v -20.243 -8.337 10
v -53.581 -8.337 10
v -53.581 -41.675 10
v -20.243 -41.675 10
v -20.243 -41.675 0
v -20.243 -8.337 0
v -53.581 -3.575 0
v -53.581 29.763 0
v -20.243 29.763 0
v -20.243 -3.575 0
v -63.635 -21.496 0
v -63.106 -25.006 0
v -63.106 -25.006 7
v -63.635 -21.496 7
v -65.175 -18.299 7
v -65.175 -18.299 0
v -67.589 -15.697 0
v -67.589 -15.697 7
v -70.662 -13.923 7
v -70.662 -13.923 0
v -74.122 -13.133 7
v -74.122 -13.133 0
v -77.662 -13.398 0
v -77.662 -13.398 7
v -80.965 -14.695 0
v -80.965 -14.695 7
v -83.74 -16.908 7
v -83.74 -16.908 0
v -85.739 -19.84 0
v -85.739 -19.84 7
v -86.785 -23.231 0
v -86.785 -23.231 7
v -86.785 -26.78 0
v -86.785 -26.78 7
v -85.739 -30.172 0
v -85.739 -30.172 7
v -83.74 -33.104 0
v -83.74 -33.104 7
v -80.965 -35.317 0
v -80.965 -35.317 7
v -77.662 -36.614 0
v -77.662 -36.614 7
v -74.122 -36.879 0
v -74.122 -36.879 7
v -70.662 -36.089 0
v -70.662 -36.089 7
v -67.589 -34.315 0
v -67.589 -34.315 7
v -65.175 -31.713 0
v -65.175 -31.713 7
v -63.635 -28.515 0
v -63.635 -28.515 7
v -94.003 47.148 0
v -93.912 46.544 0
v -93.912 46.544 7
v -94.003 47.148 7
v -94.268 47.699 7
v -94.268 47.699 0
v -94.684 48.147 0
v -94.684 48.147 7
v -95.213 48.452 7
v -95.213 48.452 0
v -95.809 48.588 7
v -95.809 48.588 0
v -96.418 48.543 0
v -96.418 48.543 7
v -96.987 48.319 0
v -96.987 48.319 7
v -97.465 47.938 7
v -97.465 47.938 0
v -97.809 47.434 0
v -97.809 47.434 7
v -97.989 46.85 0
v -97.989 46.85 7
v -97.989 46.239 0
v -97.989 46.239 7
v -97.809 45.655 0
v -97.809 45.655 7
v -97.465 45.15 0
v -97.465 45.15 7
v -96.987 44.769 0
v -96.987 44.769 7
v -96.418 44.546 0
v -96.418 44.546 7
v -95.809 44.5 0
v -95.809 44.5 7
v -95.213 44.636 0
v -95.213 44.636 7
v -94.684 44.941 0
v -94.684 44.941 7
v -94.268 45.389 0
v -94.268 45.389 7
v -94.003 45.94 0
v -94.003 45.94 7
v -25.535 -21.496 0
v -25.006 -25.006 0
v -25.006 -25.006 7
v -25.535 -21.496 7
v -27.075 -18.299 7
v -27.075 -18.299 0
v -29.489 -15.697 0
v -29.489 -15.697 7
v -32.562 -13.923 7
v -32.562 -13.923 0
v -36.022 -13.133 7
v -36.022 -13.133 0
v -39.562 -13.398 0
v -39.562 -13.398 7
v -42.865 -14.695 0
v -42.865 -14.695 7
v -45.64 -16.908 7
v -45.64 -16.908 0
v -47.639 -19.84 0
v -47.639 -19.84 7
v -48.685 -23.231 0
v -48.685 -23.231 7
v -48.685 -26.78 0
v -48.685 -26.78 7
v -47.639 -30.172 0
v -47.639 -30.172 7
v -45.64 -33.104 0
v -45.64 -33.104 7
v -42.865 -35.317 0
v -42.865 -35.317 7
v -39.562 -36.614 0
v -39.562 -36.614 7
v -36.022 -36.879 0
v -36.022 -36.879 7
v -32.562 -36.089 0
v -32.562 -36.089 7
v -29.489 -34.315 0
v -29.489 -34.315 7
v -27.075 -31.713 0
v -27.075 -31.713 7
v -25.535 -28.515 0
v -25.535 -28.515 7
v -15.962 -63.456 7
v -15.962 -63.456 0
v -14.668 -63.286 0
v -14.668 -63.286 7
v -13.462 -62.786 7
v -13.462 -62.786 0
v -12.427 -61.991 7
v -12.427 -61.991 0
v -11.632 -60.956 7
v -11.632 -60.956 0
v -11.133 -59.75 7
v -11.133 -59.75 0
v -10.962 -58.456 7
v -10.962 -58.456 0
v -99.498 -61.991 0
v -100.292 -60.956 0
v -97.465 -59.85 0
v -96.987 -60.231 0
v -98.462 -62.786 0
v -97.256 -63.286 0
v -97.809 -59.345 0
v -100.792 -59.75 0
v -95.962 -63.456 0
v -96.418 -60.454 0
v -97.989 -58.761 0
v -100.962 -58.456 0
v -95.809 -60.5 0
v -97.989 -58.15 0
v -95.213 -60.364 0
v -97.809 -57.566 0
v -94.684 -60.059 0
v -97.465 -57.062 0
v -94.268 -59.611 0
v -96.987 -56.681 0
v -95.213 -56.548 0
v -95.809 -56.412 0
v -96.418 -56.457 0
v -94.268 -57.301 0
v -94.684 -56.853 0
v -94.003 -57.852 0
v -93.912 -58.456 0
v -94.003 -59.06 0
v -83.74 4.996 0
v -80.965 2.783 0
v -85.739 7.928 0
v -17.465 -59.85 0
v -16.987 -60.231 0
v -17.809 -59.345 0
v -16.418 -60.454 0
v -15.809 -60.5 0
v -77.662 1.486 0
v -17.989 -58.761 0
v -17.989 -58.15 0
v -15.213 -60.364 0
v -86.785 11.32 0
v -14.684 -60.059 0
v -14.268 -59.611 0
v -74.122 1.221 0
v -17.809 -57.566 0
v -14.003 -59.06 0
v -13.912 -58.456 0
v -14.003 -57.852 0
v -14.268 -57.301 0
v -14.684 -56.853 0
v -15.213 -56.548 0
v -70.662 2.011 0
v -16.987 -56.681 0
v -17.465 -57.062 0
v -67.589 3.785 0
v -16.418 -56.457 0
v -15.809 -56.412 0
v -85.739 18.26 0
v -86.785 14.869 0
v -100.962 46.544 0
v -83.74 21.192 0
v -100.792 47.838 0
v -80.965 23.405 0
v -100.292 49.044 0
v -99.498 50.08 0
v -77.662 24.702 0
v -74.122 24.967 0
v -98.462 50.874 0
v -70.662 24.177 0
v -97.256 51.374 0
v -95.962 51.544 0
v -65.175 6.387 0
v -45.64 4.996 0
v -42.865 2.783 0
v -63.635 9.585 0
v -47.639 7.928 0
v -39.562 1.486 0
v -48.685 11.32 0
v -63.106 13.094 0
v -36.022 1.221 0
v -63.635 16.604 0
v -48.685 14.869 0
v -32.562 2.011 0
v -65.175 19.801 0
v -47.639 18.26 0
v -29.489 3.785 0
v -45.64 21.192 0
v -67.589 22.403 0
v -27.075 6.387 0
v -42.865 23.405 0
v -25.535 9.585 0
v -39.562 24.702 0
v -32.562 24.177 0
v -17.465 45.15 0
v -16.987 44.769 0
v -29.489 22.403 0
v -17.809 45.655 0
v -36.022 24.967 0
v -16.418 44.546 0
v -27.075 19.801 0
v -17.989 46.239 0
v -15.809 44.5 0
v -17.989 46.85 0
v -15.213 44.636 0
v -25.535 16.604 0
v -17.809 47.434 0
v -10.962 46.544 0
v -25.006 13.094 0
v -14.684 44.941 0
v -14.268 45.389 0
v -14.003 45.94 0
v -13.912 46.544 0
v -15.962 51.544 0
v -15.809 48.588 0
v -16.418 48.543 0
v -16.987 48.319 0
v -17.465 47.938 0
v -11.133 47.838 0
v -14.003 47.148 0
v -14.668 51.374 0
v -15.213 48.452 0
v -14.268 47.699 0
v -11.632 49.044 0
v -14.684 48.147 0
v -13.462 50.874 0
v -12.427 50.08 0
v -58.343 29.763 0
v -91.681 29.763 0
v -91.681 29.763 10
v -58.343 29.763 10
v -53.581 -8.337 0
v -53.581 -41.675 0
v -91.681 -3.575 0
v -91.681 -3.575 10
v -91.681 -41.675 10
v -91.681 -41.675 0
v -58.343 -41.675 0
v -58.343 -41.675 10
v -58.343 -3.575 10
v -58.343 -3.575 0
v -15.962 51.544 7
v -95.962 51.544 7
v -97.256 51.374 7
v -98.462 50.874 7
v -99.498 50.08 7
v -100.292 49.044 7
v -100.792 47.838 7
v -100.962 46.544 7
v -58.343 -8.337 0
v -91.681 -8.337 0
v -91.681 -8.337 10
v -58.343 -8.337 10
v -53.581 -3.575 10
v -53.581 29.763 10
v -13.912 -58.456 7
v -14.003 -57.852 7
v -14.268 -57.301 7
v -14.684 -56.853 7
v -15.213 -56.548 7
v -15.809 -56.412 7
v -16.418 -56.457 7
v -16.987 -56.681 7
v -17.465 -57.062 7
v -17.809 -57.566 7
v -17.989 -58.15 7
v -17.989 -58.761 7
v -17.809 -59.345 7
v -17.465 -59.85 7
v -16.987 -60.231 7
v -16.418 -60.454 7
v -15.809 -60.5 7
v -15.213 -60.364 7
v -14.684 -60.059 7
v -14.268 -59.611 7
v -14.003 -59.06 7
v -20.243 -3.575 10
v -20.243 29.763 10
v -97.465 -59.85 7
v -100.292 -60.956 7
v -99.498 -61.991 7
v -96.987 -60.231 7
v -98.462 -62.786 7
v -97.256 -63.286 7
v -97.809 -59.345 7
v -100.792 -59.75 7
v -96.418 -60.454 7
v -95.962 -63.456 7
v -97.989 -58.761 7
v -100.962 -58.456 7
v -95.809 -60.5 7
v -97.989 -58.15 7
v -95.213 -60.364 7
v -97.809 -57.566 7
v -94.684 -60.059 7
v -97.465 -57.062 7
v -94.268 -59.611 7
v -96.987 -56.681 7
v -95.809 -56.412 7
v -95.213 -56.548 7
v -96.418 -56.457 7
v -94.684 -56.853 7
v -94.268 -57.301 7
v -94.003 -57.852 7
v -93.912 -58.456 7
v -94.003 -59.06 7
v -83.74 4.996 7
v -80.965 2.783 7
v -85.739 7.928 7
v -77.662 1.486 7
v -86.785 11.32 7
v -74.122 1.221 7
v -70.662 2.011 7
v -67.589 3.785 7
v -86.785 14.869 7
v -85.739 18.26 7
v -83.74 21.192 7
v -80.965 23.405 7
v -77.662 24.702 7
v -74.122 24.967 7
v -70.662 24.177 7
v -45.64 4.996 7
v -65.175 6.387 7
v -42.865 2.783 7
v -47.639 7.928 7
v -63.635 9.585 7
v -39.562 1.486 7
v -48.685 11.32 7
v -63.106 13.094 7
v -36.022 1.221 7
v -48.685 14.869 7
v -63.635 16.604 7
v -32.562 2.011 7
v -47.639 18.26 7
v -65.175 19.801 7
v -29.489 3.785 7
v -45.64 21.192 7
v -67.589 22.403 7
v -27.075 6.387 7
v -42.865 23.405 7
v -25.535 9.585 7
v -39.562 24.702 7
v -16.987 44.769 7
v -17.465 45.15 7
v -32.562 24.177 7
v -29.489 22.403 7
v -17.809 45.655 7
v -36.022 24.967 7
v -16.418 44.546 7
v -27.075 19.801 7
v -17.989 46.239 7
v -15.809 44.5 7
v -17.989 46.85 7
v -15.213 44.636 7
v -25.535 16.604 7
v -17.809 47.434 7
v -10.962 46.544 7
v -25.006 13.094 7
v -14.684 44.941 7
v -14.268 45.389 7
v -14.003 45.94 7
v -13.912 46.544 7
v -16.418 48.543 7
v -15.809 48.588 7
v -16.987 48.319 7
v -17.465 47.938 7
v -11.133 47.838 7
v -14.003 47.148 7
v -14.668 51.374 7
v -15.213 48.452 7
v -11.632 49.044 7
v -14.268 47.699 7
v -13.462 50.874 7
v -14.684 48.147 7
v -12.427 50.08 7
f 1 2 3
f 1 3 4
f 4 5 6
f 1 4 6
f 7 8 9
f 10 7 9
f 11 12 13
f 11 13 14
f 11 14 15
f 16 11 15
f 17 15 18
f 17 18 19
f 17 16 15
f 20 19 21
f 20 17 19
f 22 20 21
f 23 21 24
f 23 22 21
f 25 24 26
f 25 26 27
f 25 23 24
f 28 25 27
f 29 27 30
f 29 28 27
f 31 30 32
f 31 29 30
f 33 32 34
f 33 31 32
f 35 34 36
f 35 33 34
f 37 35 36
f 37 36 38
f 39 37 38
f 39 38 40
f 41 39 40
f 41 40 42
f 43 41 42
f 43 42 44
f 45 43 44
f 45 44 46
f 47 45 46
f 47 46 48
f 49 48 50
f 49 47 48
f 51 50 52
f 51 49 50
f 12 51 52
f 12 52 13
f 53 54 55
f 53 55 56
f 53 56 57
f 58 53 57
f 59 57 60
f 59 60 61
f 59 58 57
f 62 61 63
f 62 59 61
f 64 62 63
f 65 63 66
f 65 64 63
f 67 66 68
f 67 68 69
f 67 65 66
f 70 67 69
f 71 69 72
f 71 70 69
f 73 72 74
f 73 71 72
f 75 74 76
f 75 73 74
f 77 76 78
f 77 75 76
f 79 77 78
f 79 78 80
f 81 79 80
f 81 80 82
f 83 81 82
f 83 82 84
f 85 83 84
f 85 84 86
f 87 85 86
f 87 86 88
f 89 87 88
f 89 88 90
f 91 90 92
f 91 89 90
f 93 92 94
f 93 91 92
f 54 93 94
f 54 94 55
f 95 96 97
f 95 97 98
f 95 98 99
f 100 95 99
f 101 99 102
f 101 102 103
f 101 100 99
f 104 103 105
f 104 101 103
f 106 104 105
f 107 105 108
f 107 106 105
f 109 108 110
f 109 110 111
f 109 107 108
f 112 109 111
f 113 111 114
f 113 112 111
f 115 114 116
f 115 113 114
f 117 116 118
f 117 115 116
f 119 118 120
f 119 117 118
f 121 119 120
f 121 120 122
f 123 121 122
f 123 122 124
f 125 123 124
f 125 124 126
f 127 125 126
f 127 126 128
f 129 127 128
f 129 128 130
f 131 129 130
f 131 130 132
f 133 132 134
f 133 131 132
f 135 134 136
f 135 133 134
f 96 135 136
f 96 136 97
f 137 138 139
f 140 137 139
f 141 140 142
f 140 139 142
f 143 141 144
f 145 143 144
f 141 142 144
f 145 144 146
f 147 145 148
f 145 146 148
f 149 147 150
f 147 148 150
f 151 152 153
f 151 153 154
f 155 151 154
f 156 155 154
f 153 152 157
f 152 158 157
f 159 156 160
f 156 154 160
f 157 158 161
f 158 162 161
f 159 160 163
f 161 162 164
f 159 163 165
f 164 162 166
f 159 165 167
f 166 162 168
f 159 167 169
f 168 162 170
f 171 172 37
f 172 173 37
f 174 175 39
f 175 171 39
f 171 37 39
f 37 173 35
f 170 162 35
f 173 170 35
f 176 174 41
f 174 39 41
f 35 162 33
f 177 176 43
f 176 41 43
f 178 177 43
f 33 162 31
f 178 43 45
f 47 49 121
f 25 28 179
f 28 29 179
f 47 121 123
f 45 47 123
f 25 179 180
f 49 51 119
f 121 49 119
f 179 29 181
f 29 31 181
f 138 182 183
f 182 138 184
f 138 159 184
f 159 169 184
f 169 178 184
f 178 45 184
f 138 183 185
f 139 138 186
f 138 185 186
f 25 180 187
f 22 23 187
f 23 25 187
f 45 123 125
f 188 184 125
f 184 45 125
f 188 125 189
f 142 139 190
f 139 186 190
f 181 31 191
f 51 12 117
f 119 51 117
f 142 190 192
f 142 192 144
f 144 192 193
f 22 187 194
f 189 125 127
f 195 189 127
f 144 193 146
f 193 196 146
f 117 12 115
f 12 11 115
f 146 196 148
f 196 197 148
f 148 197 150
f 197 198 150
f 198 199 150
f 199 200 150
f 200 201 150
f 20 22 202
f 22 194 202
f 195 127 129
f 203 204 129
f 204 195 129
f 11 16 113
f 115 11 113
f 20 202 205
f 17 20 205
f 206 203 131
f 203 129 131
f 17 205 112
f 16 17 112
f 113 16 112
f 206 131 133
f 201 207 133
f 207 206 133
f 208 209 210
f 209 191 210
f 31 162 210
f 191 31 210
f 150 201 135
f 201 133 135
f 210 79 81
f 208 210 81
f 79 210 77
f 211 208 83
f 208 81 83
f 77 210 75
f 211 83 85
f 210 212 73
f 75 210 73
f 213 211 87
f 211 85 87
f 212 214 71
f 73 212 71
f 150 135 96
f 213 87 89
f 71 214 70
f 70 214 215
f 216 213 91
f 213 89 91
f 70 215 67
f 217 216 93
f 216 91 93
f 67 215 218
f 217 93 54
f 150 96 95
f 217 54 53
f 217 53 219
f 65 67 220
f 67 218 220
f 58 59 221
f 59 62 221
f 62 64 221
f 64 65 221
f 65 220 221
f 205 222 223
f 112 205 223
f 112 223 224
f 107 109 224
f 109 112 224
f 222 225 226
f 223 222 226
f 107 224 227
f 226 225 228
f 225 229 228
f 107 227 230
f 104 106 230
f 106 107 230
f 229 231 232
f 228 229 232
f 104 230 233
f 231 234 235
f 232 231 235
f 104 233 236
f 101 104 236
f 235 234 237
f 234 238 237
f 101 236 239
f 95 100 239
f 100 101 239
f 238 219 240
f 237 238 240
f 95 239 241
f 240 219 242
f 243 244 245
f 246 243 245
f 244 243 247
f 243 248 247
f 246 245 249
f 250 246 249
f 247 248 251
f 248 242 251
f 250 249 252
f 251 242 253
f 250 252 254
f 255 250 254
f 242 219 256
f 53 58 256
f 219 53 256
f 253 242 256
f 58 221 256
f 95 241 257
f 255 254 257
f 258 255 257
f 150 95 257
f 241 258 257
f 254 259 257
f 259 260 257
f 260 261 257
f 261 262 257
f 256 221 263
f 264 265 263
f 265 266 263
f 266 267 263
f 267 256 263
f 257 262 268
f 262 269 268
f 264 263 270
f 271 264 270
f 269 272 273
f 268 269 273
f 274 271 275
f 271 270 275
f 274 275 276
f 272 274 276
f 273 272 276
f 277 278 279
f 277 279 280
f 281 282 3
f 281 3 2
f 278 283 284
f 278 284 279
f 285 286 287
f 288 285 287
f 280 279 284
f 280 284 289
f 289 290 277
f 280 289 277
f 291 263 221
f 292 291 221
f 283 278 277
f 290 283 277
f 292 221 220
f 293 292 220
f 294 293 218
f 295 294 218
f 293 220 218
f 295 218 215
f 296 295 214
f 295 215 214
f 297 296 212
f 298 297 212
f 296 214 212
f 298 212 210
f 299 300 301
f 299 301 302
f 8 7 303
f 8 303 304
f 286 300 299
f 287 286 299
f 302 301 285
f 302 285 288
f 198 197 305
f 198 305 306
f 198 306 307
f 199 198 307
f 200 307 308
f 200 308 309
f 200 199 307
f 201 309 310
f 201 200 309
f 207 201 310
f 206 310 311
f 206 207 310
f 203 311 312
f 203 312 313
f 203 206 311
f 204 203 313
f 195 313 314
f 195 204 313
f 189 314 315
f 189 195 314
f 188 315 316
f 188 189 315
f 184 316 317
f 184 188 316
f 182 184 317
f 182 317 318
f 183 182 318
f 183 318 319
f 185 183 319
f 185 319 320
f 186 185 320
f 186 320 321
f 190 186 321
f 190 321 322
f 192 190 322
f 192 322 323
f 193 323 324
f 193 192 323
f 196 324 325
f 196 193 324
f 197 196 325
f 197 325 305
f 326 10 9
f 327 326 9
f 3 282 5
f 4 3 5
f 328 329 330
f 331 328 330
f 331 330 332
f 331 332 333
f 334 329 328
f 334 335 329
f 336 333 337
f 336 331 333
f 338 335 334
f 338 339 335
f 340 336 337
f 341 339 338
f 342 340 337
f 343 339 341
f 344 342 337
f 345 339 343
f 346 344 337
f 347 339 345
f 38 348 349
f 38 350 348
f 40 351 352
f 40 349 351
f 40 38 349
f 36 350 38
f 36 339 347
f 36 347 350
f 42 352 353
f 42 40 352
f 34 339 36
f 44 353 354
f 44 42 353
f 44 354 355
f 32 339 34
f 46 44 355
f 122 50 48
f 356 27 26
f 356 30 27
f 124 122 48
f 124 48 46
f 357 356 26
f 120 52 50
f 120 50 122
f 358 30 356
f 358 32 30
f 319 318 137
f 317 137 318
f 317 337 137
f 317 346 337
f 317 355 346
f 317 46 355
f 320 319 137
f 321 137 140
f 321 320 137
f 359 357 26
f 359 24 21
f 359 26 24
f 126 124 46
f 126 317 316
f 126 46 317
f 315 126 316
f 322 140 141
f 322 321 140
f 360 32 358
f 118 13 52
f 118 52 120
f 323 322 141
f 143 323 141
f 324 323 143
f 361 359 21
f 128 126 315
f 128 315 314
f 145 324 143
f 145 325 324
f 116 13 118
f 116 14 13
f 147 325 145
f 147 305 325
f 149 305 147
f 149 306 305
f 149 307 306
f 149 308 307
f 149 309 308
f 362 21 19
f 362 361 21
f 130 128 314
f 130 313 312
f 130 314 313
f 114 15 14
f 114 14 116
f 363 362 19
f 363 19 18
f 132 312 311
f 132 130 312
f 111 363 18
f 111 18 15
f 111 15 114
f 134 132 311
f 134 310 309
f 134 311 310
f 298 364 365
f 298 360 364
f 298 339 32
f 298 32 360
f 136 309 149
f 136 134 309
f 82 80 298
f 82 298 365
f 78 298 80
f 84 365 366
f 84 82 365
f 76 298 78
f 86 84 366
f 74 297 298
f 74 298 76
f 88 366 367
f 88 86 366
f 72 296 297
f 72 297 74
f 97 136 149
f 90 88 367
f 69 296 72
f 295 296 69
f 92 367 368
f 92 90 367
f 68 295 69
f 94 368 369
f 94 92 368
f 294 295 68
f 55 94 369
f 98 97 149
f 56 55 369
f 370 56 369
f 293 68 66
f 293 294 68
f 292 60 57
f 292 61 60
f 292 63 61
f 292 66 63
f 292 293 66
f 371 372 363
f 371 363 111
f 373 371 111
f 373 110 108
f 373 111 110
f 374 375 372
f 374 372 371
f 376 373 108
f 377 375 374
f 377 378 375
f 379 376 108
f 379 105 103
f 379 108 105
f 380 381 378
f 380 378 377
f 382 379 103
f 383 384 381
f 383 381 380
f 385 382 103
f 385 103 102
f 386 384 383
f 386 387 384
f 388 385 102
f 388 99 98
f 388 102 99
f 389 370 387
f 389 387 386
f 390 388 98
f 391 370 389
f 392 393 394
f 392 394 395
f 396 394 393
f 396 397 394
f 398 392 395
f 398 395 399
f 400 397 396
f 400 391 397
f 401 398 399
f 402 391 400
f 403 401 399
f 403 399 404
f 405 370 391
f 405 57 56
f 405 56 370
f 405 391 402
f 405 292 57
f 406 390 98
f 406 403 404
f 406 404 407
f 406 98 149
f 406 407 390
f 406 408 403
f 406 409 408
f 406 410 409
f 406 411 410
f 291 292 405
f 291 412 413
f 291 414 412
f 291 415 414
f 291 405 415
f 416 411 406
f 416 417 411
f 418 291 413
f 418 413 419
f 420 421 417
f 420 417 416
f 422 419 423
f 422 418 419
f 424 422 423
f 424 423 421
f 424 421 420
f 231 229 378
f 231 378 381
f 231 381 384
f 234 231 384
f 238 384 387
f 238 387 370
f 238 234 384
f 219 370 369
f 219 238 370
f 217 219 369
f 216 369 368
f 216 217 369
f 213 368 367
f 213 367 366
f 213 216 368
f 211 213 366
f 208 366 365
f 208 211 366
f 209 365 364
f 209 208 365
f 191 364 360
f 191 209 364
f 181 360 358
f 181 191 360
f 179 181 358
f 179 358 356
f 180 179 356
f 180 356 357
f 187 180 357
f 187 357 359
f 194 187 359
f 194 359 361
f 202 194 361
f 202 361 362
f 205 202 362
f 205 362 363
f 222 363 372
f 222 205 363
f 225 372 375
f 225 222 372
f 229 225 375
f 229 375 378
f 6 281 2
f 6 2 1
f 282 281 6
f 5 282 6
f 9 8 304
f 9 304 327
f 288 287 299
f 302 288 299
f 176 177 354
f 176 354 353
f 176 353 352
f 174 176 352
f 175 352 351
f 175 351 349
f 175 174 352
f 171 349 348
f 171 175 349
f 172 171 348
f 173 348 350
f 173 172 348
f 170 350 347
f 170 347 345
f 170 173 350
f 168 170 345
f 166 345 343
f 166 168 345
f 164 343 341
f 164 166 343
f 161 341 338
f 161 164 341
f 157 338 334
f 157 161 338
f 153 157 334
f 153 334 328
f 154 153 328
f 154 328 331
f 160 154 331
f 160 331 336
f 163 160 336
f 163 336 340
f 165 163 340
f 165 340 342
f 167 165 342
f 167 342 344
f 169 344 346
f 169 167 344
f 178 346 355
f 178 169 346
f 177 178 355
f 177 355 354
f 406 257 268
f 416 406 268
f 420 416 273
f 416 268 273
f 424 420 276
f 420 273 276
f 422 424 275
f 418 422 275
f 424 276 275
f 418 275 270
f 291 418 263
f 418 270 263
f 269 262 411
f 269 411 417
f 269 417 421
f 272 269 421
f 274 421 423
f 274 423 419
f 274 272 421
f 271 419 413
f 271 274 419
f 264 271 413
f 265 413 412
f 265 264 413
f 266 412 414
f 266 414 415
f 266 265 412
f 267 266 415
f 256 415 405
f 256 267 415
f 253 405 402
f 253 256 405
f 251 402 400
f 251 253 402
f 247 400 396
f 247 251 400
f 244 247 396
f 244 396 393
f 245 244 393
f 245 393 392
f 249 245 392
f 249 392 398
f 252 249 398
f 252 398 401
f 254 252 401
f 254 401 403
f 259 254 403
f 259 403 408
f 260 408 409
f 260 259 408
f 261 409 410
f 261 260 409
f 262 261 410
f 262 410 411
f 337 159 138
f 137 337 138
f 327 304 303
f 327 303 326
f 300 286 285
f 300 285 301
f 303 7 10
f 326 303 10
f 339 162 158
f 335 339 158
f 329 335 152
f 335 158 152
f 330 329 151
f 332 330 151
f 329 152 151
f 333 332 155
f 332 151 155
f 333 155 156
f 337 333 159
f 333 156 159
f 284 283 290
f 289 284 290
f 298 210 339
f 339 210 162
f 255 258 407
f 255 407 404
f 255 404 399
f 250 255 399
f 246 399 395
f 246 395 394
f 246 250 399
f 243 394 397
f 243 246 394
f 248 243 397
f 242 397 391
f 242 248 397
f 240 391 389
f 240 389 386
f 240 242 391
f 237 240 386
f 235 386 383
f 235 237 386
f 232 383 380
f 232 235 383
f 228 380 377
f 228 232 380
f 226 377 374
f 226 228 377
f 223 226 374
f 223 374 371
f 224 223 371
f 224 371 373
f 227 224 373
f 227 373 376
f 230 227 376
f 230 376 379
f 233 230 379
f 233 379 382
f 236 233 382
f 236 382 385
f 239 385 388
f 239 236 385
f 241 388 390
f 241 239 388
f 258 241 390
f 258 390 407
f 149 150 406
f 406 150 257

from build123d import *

# Parameters (mm, degrees)
F0_R     = 2.05
F0_W     = 33.3375
F0_H     = 33.3375
F0_R_2   = 11.90625
F1_DEPTH = 7
F2_DEPTH = 10


with BuildPart() as f1:
    # F0 (on Top) → F1 (new body)
    with BuildSketch(Plane.XY):
        with BuildLine():
            Line((-15.9621723817, 51.5441118397), (-95.9621723817, 51.5441118397))
            ThreePointArc((-95.9621723817, 51.5441118397), (-99.4977062877, 50.0796457456), (-100.9621723817, 46.5441118397))
            Line((-100.9621723817, 46.5441118397), (-100.9621723817, -58.4558881603))
            ThreePointArc((-100.9621723817, -58.4558881603), (-99.4977062877, -61.9914220662), (-95.9621723817, -63.4558881603))
            Line((-95.9621723817, -63.4558881603), (-15.9621723817, -63.4558881603))
            ThreePointArc((-15.9621723817, -63.4558881603), (-12.4266384758, -61.9914220662), (-10.9621723817, -58.4558881603))
            Line((-10.9621723817, -58.4558881603), (-10.9621723817, 46.5441118397))
            ThreePointArc((-10.9621723817, 46.5441118397), (-12.4266384758, 50.0796457456), (-15.9621723817, 51.5441118397))
        make_face()
        with Locations((-95.9621723817, -58.4558881603)):
            Circle(F0_R, mode=Mode.SUBTRACT)
        with Locations((-15.9621723817, -58.4558881603)):
            Circle(F0_R, mode=Mode.SUBTRACT)
        with Locations((-75.0121723817, -25.0058881603)):
            Rectangle(F0_W, F0_H, mode=Mode.SUBTRACT)
        with Locations((-36.9121723817, -25.0058881603)):
            Rectangle(F0_W, F0_H, mode=Mode.SUBTRACT)
        with Locations((-75.0121723817, 13.0941118397)):
            Rectangle(F0_W, F0_H, mode=Mode.SUBTRACT)
        with Locations((-36.9121723817, 13.0941118397)):
            Rectangle(F0_W, F0_H, mode=Mode.SUBTRACT)
        with Locations((-95.9621723817, 46.5441118397)):
            Circle(F0_R, mode=Mode.SUBTRACT)
        with Locations((-15.9621723817, 46.5441118397)):
            Circle(F0_R, mode=Mode.SUBTRACT)
        with Locations((-75.0121723817, 13.0941118397)):
            Rectangle(F0_W, F0_H)
        with Locations((-75.0121723817, 13.0941118397)):
            Circle(F0_R_2, mode=Mode.SUBTRACT)
        with Locations((-36.9121723817, 13.0941118397)):
            Rectangle(F0_W, F0_H)
        with Locations((-36.9121723817, 13.0941118397)):
            Circle(F0_R_2, mode=Mode.SUBTRACT)
        with Locations((-75.0121723817, -25.0058881603)):
            Rectangle(F0_W, F0_H)
        with Locations((-75.0121723817, -25.0058881603)):
            Circle(F0_R_2, mode=Mode.SUBTRACT)
        with Locations((-36.9121723817, -25.0058881603)):
            Rectangle(F0_W, F0_H)
        with Locations((-36.9121723817, -25.0058881603)):
            Circle(F0_R_2, mode=Mode.SUBTRACT)
    extrude(amount=F1_DEPTH)


with BuildPart() as f2:
    # F0 (on Top) → F2 (new body)
    with BuildSketch(Plane.XY):
        with Locations((-36.9121723817, 13.0941118397)):
            Rectangle(F0_W, F0_H)
        with Locations((-36.9121723817, 13.0941118397)):
            Circle(F0_R_2, mode=Mode.SUBTRACT)
        with Locations((-36.9121723817, 13.0941118397)):
            Circle(F0_R_2)
    extrude(amount=F2_DEPTH)


with BuildPart() as f2b:
    # F0 (on Top) → F2, piece 2 (new body)
    with BuildSketch(Plane.XY):
        with Locations((-75.0121723817, 13.0941118397)):
            Rectangle(F0_W, F0_H)
        with Locations((-75.0121723817, 13.0941118397)):
            Circle(F0_R_2, mode=Mode.SUBTRACT)
        with Locations((-75.0121723817, 13.0941118397)):
            Circle(F0_R_2)
    extrude(amount=F2_DEPTH)


with BuildPart() as f2c:
    # F0 (on Top) → F2, piece 3 (new body)
    with BuildSketch(Plane.XY):
        with Locations((-36.9121723817, -25.0058881603)):
            Rectangle(F0_W, F0_H)
        with Locations((-36.9121723817, -25.0058881603)):
            Circle(F0_R_2, mode=Mode.SUBTRACT)
        with Locations((-36.9121723817, -25.0058881603)):
            Circle(F0_R_2)
    extrude(amount=F2_DEPTH)


with BuildPart() as f2d:
    # F0 (on Top) → F2, piece 4 (new body)
    with BuildSketch(Plane.XY):
        with Locations((-75.0121723817, -25.0058881603)):
            Rectangle(F0_W, F0_H)
        with Locations((-75.0121723817, -25.0058881603)):
            Circle(F0_R_2, mode=Mode.SUBTRACT)
        with Locations((-75.0121723817, -25.0058881603)):
            Circle(F0_R_2)
    extrude(amount=F2_DEPTH)


solid = Compound([f1.part, f2.part, f2b.part, f2c.part, f2d.part])
